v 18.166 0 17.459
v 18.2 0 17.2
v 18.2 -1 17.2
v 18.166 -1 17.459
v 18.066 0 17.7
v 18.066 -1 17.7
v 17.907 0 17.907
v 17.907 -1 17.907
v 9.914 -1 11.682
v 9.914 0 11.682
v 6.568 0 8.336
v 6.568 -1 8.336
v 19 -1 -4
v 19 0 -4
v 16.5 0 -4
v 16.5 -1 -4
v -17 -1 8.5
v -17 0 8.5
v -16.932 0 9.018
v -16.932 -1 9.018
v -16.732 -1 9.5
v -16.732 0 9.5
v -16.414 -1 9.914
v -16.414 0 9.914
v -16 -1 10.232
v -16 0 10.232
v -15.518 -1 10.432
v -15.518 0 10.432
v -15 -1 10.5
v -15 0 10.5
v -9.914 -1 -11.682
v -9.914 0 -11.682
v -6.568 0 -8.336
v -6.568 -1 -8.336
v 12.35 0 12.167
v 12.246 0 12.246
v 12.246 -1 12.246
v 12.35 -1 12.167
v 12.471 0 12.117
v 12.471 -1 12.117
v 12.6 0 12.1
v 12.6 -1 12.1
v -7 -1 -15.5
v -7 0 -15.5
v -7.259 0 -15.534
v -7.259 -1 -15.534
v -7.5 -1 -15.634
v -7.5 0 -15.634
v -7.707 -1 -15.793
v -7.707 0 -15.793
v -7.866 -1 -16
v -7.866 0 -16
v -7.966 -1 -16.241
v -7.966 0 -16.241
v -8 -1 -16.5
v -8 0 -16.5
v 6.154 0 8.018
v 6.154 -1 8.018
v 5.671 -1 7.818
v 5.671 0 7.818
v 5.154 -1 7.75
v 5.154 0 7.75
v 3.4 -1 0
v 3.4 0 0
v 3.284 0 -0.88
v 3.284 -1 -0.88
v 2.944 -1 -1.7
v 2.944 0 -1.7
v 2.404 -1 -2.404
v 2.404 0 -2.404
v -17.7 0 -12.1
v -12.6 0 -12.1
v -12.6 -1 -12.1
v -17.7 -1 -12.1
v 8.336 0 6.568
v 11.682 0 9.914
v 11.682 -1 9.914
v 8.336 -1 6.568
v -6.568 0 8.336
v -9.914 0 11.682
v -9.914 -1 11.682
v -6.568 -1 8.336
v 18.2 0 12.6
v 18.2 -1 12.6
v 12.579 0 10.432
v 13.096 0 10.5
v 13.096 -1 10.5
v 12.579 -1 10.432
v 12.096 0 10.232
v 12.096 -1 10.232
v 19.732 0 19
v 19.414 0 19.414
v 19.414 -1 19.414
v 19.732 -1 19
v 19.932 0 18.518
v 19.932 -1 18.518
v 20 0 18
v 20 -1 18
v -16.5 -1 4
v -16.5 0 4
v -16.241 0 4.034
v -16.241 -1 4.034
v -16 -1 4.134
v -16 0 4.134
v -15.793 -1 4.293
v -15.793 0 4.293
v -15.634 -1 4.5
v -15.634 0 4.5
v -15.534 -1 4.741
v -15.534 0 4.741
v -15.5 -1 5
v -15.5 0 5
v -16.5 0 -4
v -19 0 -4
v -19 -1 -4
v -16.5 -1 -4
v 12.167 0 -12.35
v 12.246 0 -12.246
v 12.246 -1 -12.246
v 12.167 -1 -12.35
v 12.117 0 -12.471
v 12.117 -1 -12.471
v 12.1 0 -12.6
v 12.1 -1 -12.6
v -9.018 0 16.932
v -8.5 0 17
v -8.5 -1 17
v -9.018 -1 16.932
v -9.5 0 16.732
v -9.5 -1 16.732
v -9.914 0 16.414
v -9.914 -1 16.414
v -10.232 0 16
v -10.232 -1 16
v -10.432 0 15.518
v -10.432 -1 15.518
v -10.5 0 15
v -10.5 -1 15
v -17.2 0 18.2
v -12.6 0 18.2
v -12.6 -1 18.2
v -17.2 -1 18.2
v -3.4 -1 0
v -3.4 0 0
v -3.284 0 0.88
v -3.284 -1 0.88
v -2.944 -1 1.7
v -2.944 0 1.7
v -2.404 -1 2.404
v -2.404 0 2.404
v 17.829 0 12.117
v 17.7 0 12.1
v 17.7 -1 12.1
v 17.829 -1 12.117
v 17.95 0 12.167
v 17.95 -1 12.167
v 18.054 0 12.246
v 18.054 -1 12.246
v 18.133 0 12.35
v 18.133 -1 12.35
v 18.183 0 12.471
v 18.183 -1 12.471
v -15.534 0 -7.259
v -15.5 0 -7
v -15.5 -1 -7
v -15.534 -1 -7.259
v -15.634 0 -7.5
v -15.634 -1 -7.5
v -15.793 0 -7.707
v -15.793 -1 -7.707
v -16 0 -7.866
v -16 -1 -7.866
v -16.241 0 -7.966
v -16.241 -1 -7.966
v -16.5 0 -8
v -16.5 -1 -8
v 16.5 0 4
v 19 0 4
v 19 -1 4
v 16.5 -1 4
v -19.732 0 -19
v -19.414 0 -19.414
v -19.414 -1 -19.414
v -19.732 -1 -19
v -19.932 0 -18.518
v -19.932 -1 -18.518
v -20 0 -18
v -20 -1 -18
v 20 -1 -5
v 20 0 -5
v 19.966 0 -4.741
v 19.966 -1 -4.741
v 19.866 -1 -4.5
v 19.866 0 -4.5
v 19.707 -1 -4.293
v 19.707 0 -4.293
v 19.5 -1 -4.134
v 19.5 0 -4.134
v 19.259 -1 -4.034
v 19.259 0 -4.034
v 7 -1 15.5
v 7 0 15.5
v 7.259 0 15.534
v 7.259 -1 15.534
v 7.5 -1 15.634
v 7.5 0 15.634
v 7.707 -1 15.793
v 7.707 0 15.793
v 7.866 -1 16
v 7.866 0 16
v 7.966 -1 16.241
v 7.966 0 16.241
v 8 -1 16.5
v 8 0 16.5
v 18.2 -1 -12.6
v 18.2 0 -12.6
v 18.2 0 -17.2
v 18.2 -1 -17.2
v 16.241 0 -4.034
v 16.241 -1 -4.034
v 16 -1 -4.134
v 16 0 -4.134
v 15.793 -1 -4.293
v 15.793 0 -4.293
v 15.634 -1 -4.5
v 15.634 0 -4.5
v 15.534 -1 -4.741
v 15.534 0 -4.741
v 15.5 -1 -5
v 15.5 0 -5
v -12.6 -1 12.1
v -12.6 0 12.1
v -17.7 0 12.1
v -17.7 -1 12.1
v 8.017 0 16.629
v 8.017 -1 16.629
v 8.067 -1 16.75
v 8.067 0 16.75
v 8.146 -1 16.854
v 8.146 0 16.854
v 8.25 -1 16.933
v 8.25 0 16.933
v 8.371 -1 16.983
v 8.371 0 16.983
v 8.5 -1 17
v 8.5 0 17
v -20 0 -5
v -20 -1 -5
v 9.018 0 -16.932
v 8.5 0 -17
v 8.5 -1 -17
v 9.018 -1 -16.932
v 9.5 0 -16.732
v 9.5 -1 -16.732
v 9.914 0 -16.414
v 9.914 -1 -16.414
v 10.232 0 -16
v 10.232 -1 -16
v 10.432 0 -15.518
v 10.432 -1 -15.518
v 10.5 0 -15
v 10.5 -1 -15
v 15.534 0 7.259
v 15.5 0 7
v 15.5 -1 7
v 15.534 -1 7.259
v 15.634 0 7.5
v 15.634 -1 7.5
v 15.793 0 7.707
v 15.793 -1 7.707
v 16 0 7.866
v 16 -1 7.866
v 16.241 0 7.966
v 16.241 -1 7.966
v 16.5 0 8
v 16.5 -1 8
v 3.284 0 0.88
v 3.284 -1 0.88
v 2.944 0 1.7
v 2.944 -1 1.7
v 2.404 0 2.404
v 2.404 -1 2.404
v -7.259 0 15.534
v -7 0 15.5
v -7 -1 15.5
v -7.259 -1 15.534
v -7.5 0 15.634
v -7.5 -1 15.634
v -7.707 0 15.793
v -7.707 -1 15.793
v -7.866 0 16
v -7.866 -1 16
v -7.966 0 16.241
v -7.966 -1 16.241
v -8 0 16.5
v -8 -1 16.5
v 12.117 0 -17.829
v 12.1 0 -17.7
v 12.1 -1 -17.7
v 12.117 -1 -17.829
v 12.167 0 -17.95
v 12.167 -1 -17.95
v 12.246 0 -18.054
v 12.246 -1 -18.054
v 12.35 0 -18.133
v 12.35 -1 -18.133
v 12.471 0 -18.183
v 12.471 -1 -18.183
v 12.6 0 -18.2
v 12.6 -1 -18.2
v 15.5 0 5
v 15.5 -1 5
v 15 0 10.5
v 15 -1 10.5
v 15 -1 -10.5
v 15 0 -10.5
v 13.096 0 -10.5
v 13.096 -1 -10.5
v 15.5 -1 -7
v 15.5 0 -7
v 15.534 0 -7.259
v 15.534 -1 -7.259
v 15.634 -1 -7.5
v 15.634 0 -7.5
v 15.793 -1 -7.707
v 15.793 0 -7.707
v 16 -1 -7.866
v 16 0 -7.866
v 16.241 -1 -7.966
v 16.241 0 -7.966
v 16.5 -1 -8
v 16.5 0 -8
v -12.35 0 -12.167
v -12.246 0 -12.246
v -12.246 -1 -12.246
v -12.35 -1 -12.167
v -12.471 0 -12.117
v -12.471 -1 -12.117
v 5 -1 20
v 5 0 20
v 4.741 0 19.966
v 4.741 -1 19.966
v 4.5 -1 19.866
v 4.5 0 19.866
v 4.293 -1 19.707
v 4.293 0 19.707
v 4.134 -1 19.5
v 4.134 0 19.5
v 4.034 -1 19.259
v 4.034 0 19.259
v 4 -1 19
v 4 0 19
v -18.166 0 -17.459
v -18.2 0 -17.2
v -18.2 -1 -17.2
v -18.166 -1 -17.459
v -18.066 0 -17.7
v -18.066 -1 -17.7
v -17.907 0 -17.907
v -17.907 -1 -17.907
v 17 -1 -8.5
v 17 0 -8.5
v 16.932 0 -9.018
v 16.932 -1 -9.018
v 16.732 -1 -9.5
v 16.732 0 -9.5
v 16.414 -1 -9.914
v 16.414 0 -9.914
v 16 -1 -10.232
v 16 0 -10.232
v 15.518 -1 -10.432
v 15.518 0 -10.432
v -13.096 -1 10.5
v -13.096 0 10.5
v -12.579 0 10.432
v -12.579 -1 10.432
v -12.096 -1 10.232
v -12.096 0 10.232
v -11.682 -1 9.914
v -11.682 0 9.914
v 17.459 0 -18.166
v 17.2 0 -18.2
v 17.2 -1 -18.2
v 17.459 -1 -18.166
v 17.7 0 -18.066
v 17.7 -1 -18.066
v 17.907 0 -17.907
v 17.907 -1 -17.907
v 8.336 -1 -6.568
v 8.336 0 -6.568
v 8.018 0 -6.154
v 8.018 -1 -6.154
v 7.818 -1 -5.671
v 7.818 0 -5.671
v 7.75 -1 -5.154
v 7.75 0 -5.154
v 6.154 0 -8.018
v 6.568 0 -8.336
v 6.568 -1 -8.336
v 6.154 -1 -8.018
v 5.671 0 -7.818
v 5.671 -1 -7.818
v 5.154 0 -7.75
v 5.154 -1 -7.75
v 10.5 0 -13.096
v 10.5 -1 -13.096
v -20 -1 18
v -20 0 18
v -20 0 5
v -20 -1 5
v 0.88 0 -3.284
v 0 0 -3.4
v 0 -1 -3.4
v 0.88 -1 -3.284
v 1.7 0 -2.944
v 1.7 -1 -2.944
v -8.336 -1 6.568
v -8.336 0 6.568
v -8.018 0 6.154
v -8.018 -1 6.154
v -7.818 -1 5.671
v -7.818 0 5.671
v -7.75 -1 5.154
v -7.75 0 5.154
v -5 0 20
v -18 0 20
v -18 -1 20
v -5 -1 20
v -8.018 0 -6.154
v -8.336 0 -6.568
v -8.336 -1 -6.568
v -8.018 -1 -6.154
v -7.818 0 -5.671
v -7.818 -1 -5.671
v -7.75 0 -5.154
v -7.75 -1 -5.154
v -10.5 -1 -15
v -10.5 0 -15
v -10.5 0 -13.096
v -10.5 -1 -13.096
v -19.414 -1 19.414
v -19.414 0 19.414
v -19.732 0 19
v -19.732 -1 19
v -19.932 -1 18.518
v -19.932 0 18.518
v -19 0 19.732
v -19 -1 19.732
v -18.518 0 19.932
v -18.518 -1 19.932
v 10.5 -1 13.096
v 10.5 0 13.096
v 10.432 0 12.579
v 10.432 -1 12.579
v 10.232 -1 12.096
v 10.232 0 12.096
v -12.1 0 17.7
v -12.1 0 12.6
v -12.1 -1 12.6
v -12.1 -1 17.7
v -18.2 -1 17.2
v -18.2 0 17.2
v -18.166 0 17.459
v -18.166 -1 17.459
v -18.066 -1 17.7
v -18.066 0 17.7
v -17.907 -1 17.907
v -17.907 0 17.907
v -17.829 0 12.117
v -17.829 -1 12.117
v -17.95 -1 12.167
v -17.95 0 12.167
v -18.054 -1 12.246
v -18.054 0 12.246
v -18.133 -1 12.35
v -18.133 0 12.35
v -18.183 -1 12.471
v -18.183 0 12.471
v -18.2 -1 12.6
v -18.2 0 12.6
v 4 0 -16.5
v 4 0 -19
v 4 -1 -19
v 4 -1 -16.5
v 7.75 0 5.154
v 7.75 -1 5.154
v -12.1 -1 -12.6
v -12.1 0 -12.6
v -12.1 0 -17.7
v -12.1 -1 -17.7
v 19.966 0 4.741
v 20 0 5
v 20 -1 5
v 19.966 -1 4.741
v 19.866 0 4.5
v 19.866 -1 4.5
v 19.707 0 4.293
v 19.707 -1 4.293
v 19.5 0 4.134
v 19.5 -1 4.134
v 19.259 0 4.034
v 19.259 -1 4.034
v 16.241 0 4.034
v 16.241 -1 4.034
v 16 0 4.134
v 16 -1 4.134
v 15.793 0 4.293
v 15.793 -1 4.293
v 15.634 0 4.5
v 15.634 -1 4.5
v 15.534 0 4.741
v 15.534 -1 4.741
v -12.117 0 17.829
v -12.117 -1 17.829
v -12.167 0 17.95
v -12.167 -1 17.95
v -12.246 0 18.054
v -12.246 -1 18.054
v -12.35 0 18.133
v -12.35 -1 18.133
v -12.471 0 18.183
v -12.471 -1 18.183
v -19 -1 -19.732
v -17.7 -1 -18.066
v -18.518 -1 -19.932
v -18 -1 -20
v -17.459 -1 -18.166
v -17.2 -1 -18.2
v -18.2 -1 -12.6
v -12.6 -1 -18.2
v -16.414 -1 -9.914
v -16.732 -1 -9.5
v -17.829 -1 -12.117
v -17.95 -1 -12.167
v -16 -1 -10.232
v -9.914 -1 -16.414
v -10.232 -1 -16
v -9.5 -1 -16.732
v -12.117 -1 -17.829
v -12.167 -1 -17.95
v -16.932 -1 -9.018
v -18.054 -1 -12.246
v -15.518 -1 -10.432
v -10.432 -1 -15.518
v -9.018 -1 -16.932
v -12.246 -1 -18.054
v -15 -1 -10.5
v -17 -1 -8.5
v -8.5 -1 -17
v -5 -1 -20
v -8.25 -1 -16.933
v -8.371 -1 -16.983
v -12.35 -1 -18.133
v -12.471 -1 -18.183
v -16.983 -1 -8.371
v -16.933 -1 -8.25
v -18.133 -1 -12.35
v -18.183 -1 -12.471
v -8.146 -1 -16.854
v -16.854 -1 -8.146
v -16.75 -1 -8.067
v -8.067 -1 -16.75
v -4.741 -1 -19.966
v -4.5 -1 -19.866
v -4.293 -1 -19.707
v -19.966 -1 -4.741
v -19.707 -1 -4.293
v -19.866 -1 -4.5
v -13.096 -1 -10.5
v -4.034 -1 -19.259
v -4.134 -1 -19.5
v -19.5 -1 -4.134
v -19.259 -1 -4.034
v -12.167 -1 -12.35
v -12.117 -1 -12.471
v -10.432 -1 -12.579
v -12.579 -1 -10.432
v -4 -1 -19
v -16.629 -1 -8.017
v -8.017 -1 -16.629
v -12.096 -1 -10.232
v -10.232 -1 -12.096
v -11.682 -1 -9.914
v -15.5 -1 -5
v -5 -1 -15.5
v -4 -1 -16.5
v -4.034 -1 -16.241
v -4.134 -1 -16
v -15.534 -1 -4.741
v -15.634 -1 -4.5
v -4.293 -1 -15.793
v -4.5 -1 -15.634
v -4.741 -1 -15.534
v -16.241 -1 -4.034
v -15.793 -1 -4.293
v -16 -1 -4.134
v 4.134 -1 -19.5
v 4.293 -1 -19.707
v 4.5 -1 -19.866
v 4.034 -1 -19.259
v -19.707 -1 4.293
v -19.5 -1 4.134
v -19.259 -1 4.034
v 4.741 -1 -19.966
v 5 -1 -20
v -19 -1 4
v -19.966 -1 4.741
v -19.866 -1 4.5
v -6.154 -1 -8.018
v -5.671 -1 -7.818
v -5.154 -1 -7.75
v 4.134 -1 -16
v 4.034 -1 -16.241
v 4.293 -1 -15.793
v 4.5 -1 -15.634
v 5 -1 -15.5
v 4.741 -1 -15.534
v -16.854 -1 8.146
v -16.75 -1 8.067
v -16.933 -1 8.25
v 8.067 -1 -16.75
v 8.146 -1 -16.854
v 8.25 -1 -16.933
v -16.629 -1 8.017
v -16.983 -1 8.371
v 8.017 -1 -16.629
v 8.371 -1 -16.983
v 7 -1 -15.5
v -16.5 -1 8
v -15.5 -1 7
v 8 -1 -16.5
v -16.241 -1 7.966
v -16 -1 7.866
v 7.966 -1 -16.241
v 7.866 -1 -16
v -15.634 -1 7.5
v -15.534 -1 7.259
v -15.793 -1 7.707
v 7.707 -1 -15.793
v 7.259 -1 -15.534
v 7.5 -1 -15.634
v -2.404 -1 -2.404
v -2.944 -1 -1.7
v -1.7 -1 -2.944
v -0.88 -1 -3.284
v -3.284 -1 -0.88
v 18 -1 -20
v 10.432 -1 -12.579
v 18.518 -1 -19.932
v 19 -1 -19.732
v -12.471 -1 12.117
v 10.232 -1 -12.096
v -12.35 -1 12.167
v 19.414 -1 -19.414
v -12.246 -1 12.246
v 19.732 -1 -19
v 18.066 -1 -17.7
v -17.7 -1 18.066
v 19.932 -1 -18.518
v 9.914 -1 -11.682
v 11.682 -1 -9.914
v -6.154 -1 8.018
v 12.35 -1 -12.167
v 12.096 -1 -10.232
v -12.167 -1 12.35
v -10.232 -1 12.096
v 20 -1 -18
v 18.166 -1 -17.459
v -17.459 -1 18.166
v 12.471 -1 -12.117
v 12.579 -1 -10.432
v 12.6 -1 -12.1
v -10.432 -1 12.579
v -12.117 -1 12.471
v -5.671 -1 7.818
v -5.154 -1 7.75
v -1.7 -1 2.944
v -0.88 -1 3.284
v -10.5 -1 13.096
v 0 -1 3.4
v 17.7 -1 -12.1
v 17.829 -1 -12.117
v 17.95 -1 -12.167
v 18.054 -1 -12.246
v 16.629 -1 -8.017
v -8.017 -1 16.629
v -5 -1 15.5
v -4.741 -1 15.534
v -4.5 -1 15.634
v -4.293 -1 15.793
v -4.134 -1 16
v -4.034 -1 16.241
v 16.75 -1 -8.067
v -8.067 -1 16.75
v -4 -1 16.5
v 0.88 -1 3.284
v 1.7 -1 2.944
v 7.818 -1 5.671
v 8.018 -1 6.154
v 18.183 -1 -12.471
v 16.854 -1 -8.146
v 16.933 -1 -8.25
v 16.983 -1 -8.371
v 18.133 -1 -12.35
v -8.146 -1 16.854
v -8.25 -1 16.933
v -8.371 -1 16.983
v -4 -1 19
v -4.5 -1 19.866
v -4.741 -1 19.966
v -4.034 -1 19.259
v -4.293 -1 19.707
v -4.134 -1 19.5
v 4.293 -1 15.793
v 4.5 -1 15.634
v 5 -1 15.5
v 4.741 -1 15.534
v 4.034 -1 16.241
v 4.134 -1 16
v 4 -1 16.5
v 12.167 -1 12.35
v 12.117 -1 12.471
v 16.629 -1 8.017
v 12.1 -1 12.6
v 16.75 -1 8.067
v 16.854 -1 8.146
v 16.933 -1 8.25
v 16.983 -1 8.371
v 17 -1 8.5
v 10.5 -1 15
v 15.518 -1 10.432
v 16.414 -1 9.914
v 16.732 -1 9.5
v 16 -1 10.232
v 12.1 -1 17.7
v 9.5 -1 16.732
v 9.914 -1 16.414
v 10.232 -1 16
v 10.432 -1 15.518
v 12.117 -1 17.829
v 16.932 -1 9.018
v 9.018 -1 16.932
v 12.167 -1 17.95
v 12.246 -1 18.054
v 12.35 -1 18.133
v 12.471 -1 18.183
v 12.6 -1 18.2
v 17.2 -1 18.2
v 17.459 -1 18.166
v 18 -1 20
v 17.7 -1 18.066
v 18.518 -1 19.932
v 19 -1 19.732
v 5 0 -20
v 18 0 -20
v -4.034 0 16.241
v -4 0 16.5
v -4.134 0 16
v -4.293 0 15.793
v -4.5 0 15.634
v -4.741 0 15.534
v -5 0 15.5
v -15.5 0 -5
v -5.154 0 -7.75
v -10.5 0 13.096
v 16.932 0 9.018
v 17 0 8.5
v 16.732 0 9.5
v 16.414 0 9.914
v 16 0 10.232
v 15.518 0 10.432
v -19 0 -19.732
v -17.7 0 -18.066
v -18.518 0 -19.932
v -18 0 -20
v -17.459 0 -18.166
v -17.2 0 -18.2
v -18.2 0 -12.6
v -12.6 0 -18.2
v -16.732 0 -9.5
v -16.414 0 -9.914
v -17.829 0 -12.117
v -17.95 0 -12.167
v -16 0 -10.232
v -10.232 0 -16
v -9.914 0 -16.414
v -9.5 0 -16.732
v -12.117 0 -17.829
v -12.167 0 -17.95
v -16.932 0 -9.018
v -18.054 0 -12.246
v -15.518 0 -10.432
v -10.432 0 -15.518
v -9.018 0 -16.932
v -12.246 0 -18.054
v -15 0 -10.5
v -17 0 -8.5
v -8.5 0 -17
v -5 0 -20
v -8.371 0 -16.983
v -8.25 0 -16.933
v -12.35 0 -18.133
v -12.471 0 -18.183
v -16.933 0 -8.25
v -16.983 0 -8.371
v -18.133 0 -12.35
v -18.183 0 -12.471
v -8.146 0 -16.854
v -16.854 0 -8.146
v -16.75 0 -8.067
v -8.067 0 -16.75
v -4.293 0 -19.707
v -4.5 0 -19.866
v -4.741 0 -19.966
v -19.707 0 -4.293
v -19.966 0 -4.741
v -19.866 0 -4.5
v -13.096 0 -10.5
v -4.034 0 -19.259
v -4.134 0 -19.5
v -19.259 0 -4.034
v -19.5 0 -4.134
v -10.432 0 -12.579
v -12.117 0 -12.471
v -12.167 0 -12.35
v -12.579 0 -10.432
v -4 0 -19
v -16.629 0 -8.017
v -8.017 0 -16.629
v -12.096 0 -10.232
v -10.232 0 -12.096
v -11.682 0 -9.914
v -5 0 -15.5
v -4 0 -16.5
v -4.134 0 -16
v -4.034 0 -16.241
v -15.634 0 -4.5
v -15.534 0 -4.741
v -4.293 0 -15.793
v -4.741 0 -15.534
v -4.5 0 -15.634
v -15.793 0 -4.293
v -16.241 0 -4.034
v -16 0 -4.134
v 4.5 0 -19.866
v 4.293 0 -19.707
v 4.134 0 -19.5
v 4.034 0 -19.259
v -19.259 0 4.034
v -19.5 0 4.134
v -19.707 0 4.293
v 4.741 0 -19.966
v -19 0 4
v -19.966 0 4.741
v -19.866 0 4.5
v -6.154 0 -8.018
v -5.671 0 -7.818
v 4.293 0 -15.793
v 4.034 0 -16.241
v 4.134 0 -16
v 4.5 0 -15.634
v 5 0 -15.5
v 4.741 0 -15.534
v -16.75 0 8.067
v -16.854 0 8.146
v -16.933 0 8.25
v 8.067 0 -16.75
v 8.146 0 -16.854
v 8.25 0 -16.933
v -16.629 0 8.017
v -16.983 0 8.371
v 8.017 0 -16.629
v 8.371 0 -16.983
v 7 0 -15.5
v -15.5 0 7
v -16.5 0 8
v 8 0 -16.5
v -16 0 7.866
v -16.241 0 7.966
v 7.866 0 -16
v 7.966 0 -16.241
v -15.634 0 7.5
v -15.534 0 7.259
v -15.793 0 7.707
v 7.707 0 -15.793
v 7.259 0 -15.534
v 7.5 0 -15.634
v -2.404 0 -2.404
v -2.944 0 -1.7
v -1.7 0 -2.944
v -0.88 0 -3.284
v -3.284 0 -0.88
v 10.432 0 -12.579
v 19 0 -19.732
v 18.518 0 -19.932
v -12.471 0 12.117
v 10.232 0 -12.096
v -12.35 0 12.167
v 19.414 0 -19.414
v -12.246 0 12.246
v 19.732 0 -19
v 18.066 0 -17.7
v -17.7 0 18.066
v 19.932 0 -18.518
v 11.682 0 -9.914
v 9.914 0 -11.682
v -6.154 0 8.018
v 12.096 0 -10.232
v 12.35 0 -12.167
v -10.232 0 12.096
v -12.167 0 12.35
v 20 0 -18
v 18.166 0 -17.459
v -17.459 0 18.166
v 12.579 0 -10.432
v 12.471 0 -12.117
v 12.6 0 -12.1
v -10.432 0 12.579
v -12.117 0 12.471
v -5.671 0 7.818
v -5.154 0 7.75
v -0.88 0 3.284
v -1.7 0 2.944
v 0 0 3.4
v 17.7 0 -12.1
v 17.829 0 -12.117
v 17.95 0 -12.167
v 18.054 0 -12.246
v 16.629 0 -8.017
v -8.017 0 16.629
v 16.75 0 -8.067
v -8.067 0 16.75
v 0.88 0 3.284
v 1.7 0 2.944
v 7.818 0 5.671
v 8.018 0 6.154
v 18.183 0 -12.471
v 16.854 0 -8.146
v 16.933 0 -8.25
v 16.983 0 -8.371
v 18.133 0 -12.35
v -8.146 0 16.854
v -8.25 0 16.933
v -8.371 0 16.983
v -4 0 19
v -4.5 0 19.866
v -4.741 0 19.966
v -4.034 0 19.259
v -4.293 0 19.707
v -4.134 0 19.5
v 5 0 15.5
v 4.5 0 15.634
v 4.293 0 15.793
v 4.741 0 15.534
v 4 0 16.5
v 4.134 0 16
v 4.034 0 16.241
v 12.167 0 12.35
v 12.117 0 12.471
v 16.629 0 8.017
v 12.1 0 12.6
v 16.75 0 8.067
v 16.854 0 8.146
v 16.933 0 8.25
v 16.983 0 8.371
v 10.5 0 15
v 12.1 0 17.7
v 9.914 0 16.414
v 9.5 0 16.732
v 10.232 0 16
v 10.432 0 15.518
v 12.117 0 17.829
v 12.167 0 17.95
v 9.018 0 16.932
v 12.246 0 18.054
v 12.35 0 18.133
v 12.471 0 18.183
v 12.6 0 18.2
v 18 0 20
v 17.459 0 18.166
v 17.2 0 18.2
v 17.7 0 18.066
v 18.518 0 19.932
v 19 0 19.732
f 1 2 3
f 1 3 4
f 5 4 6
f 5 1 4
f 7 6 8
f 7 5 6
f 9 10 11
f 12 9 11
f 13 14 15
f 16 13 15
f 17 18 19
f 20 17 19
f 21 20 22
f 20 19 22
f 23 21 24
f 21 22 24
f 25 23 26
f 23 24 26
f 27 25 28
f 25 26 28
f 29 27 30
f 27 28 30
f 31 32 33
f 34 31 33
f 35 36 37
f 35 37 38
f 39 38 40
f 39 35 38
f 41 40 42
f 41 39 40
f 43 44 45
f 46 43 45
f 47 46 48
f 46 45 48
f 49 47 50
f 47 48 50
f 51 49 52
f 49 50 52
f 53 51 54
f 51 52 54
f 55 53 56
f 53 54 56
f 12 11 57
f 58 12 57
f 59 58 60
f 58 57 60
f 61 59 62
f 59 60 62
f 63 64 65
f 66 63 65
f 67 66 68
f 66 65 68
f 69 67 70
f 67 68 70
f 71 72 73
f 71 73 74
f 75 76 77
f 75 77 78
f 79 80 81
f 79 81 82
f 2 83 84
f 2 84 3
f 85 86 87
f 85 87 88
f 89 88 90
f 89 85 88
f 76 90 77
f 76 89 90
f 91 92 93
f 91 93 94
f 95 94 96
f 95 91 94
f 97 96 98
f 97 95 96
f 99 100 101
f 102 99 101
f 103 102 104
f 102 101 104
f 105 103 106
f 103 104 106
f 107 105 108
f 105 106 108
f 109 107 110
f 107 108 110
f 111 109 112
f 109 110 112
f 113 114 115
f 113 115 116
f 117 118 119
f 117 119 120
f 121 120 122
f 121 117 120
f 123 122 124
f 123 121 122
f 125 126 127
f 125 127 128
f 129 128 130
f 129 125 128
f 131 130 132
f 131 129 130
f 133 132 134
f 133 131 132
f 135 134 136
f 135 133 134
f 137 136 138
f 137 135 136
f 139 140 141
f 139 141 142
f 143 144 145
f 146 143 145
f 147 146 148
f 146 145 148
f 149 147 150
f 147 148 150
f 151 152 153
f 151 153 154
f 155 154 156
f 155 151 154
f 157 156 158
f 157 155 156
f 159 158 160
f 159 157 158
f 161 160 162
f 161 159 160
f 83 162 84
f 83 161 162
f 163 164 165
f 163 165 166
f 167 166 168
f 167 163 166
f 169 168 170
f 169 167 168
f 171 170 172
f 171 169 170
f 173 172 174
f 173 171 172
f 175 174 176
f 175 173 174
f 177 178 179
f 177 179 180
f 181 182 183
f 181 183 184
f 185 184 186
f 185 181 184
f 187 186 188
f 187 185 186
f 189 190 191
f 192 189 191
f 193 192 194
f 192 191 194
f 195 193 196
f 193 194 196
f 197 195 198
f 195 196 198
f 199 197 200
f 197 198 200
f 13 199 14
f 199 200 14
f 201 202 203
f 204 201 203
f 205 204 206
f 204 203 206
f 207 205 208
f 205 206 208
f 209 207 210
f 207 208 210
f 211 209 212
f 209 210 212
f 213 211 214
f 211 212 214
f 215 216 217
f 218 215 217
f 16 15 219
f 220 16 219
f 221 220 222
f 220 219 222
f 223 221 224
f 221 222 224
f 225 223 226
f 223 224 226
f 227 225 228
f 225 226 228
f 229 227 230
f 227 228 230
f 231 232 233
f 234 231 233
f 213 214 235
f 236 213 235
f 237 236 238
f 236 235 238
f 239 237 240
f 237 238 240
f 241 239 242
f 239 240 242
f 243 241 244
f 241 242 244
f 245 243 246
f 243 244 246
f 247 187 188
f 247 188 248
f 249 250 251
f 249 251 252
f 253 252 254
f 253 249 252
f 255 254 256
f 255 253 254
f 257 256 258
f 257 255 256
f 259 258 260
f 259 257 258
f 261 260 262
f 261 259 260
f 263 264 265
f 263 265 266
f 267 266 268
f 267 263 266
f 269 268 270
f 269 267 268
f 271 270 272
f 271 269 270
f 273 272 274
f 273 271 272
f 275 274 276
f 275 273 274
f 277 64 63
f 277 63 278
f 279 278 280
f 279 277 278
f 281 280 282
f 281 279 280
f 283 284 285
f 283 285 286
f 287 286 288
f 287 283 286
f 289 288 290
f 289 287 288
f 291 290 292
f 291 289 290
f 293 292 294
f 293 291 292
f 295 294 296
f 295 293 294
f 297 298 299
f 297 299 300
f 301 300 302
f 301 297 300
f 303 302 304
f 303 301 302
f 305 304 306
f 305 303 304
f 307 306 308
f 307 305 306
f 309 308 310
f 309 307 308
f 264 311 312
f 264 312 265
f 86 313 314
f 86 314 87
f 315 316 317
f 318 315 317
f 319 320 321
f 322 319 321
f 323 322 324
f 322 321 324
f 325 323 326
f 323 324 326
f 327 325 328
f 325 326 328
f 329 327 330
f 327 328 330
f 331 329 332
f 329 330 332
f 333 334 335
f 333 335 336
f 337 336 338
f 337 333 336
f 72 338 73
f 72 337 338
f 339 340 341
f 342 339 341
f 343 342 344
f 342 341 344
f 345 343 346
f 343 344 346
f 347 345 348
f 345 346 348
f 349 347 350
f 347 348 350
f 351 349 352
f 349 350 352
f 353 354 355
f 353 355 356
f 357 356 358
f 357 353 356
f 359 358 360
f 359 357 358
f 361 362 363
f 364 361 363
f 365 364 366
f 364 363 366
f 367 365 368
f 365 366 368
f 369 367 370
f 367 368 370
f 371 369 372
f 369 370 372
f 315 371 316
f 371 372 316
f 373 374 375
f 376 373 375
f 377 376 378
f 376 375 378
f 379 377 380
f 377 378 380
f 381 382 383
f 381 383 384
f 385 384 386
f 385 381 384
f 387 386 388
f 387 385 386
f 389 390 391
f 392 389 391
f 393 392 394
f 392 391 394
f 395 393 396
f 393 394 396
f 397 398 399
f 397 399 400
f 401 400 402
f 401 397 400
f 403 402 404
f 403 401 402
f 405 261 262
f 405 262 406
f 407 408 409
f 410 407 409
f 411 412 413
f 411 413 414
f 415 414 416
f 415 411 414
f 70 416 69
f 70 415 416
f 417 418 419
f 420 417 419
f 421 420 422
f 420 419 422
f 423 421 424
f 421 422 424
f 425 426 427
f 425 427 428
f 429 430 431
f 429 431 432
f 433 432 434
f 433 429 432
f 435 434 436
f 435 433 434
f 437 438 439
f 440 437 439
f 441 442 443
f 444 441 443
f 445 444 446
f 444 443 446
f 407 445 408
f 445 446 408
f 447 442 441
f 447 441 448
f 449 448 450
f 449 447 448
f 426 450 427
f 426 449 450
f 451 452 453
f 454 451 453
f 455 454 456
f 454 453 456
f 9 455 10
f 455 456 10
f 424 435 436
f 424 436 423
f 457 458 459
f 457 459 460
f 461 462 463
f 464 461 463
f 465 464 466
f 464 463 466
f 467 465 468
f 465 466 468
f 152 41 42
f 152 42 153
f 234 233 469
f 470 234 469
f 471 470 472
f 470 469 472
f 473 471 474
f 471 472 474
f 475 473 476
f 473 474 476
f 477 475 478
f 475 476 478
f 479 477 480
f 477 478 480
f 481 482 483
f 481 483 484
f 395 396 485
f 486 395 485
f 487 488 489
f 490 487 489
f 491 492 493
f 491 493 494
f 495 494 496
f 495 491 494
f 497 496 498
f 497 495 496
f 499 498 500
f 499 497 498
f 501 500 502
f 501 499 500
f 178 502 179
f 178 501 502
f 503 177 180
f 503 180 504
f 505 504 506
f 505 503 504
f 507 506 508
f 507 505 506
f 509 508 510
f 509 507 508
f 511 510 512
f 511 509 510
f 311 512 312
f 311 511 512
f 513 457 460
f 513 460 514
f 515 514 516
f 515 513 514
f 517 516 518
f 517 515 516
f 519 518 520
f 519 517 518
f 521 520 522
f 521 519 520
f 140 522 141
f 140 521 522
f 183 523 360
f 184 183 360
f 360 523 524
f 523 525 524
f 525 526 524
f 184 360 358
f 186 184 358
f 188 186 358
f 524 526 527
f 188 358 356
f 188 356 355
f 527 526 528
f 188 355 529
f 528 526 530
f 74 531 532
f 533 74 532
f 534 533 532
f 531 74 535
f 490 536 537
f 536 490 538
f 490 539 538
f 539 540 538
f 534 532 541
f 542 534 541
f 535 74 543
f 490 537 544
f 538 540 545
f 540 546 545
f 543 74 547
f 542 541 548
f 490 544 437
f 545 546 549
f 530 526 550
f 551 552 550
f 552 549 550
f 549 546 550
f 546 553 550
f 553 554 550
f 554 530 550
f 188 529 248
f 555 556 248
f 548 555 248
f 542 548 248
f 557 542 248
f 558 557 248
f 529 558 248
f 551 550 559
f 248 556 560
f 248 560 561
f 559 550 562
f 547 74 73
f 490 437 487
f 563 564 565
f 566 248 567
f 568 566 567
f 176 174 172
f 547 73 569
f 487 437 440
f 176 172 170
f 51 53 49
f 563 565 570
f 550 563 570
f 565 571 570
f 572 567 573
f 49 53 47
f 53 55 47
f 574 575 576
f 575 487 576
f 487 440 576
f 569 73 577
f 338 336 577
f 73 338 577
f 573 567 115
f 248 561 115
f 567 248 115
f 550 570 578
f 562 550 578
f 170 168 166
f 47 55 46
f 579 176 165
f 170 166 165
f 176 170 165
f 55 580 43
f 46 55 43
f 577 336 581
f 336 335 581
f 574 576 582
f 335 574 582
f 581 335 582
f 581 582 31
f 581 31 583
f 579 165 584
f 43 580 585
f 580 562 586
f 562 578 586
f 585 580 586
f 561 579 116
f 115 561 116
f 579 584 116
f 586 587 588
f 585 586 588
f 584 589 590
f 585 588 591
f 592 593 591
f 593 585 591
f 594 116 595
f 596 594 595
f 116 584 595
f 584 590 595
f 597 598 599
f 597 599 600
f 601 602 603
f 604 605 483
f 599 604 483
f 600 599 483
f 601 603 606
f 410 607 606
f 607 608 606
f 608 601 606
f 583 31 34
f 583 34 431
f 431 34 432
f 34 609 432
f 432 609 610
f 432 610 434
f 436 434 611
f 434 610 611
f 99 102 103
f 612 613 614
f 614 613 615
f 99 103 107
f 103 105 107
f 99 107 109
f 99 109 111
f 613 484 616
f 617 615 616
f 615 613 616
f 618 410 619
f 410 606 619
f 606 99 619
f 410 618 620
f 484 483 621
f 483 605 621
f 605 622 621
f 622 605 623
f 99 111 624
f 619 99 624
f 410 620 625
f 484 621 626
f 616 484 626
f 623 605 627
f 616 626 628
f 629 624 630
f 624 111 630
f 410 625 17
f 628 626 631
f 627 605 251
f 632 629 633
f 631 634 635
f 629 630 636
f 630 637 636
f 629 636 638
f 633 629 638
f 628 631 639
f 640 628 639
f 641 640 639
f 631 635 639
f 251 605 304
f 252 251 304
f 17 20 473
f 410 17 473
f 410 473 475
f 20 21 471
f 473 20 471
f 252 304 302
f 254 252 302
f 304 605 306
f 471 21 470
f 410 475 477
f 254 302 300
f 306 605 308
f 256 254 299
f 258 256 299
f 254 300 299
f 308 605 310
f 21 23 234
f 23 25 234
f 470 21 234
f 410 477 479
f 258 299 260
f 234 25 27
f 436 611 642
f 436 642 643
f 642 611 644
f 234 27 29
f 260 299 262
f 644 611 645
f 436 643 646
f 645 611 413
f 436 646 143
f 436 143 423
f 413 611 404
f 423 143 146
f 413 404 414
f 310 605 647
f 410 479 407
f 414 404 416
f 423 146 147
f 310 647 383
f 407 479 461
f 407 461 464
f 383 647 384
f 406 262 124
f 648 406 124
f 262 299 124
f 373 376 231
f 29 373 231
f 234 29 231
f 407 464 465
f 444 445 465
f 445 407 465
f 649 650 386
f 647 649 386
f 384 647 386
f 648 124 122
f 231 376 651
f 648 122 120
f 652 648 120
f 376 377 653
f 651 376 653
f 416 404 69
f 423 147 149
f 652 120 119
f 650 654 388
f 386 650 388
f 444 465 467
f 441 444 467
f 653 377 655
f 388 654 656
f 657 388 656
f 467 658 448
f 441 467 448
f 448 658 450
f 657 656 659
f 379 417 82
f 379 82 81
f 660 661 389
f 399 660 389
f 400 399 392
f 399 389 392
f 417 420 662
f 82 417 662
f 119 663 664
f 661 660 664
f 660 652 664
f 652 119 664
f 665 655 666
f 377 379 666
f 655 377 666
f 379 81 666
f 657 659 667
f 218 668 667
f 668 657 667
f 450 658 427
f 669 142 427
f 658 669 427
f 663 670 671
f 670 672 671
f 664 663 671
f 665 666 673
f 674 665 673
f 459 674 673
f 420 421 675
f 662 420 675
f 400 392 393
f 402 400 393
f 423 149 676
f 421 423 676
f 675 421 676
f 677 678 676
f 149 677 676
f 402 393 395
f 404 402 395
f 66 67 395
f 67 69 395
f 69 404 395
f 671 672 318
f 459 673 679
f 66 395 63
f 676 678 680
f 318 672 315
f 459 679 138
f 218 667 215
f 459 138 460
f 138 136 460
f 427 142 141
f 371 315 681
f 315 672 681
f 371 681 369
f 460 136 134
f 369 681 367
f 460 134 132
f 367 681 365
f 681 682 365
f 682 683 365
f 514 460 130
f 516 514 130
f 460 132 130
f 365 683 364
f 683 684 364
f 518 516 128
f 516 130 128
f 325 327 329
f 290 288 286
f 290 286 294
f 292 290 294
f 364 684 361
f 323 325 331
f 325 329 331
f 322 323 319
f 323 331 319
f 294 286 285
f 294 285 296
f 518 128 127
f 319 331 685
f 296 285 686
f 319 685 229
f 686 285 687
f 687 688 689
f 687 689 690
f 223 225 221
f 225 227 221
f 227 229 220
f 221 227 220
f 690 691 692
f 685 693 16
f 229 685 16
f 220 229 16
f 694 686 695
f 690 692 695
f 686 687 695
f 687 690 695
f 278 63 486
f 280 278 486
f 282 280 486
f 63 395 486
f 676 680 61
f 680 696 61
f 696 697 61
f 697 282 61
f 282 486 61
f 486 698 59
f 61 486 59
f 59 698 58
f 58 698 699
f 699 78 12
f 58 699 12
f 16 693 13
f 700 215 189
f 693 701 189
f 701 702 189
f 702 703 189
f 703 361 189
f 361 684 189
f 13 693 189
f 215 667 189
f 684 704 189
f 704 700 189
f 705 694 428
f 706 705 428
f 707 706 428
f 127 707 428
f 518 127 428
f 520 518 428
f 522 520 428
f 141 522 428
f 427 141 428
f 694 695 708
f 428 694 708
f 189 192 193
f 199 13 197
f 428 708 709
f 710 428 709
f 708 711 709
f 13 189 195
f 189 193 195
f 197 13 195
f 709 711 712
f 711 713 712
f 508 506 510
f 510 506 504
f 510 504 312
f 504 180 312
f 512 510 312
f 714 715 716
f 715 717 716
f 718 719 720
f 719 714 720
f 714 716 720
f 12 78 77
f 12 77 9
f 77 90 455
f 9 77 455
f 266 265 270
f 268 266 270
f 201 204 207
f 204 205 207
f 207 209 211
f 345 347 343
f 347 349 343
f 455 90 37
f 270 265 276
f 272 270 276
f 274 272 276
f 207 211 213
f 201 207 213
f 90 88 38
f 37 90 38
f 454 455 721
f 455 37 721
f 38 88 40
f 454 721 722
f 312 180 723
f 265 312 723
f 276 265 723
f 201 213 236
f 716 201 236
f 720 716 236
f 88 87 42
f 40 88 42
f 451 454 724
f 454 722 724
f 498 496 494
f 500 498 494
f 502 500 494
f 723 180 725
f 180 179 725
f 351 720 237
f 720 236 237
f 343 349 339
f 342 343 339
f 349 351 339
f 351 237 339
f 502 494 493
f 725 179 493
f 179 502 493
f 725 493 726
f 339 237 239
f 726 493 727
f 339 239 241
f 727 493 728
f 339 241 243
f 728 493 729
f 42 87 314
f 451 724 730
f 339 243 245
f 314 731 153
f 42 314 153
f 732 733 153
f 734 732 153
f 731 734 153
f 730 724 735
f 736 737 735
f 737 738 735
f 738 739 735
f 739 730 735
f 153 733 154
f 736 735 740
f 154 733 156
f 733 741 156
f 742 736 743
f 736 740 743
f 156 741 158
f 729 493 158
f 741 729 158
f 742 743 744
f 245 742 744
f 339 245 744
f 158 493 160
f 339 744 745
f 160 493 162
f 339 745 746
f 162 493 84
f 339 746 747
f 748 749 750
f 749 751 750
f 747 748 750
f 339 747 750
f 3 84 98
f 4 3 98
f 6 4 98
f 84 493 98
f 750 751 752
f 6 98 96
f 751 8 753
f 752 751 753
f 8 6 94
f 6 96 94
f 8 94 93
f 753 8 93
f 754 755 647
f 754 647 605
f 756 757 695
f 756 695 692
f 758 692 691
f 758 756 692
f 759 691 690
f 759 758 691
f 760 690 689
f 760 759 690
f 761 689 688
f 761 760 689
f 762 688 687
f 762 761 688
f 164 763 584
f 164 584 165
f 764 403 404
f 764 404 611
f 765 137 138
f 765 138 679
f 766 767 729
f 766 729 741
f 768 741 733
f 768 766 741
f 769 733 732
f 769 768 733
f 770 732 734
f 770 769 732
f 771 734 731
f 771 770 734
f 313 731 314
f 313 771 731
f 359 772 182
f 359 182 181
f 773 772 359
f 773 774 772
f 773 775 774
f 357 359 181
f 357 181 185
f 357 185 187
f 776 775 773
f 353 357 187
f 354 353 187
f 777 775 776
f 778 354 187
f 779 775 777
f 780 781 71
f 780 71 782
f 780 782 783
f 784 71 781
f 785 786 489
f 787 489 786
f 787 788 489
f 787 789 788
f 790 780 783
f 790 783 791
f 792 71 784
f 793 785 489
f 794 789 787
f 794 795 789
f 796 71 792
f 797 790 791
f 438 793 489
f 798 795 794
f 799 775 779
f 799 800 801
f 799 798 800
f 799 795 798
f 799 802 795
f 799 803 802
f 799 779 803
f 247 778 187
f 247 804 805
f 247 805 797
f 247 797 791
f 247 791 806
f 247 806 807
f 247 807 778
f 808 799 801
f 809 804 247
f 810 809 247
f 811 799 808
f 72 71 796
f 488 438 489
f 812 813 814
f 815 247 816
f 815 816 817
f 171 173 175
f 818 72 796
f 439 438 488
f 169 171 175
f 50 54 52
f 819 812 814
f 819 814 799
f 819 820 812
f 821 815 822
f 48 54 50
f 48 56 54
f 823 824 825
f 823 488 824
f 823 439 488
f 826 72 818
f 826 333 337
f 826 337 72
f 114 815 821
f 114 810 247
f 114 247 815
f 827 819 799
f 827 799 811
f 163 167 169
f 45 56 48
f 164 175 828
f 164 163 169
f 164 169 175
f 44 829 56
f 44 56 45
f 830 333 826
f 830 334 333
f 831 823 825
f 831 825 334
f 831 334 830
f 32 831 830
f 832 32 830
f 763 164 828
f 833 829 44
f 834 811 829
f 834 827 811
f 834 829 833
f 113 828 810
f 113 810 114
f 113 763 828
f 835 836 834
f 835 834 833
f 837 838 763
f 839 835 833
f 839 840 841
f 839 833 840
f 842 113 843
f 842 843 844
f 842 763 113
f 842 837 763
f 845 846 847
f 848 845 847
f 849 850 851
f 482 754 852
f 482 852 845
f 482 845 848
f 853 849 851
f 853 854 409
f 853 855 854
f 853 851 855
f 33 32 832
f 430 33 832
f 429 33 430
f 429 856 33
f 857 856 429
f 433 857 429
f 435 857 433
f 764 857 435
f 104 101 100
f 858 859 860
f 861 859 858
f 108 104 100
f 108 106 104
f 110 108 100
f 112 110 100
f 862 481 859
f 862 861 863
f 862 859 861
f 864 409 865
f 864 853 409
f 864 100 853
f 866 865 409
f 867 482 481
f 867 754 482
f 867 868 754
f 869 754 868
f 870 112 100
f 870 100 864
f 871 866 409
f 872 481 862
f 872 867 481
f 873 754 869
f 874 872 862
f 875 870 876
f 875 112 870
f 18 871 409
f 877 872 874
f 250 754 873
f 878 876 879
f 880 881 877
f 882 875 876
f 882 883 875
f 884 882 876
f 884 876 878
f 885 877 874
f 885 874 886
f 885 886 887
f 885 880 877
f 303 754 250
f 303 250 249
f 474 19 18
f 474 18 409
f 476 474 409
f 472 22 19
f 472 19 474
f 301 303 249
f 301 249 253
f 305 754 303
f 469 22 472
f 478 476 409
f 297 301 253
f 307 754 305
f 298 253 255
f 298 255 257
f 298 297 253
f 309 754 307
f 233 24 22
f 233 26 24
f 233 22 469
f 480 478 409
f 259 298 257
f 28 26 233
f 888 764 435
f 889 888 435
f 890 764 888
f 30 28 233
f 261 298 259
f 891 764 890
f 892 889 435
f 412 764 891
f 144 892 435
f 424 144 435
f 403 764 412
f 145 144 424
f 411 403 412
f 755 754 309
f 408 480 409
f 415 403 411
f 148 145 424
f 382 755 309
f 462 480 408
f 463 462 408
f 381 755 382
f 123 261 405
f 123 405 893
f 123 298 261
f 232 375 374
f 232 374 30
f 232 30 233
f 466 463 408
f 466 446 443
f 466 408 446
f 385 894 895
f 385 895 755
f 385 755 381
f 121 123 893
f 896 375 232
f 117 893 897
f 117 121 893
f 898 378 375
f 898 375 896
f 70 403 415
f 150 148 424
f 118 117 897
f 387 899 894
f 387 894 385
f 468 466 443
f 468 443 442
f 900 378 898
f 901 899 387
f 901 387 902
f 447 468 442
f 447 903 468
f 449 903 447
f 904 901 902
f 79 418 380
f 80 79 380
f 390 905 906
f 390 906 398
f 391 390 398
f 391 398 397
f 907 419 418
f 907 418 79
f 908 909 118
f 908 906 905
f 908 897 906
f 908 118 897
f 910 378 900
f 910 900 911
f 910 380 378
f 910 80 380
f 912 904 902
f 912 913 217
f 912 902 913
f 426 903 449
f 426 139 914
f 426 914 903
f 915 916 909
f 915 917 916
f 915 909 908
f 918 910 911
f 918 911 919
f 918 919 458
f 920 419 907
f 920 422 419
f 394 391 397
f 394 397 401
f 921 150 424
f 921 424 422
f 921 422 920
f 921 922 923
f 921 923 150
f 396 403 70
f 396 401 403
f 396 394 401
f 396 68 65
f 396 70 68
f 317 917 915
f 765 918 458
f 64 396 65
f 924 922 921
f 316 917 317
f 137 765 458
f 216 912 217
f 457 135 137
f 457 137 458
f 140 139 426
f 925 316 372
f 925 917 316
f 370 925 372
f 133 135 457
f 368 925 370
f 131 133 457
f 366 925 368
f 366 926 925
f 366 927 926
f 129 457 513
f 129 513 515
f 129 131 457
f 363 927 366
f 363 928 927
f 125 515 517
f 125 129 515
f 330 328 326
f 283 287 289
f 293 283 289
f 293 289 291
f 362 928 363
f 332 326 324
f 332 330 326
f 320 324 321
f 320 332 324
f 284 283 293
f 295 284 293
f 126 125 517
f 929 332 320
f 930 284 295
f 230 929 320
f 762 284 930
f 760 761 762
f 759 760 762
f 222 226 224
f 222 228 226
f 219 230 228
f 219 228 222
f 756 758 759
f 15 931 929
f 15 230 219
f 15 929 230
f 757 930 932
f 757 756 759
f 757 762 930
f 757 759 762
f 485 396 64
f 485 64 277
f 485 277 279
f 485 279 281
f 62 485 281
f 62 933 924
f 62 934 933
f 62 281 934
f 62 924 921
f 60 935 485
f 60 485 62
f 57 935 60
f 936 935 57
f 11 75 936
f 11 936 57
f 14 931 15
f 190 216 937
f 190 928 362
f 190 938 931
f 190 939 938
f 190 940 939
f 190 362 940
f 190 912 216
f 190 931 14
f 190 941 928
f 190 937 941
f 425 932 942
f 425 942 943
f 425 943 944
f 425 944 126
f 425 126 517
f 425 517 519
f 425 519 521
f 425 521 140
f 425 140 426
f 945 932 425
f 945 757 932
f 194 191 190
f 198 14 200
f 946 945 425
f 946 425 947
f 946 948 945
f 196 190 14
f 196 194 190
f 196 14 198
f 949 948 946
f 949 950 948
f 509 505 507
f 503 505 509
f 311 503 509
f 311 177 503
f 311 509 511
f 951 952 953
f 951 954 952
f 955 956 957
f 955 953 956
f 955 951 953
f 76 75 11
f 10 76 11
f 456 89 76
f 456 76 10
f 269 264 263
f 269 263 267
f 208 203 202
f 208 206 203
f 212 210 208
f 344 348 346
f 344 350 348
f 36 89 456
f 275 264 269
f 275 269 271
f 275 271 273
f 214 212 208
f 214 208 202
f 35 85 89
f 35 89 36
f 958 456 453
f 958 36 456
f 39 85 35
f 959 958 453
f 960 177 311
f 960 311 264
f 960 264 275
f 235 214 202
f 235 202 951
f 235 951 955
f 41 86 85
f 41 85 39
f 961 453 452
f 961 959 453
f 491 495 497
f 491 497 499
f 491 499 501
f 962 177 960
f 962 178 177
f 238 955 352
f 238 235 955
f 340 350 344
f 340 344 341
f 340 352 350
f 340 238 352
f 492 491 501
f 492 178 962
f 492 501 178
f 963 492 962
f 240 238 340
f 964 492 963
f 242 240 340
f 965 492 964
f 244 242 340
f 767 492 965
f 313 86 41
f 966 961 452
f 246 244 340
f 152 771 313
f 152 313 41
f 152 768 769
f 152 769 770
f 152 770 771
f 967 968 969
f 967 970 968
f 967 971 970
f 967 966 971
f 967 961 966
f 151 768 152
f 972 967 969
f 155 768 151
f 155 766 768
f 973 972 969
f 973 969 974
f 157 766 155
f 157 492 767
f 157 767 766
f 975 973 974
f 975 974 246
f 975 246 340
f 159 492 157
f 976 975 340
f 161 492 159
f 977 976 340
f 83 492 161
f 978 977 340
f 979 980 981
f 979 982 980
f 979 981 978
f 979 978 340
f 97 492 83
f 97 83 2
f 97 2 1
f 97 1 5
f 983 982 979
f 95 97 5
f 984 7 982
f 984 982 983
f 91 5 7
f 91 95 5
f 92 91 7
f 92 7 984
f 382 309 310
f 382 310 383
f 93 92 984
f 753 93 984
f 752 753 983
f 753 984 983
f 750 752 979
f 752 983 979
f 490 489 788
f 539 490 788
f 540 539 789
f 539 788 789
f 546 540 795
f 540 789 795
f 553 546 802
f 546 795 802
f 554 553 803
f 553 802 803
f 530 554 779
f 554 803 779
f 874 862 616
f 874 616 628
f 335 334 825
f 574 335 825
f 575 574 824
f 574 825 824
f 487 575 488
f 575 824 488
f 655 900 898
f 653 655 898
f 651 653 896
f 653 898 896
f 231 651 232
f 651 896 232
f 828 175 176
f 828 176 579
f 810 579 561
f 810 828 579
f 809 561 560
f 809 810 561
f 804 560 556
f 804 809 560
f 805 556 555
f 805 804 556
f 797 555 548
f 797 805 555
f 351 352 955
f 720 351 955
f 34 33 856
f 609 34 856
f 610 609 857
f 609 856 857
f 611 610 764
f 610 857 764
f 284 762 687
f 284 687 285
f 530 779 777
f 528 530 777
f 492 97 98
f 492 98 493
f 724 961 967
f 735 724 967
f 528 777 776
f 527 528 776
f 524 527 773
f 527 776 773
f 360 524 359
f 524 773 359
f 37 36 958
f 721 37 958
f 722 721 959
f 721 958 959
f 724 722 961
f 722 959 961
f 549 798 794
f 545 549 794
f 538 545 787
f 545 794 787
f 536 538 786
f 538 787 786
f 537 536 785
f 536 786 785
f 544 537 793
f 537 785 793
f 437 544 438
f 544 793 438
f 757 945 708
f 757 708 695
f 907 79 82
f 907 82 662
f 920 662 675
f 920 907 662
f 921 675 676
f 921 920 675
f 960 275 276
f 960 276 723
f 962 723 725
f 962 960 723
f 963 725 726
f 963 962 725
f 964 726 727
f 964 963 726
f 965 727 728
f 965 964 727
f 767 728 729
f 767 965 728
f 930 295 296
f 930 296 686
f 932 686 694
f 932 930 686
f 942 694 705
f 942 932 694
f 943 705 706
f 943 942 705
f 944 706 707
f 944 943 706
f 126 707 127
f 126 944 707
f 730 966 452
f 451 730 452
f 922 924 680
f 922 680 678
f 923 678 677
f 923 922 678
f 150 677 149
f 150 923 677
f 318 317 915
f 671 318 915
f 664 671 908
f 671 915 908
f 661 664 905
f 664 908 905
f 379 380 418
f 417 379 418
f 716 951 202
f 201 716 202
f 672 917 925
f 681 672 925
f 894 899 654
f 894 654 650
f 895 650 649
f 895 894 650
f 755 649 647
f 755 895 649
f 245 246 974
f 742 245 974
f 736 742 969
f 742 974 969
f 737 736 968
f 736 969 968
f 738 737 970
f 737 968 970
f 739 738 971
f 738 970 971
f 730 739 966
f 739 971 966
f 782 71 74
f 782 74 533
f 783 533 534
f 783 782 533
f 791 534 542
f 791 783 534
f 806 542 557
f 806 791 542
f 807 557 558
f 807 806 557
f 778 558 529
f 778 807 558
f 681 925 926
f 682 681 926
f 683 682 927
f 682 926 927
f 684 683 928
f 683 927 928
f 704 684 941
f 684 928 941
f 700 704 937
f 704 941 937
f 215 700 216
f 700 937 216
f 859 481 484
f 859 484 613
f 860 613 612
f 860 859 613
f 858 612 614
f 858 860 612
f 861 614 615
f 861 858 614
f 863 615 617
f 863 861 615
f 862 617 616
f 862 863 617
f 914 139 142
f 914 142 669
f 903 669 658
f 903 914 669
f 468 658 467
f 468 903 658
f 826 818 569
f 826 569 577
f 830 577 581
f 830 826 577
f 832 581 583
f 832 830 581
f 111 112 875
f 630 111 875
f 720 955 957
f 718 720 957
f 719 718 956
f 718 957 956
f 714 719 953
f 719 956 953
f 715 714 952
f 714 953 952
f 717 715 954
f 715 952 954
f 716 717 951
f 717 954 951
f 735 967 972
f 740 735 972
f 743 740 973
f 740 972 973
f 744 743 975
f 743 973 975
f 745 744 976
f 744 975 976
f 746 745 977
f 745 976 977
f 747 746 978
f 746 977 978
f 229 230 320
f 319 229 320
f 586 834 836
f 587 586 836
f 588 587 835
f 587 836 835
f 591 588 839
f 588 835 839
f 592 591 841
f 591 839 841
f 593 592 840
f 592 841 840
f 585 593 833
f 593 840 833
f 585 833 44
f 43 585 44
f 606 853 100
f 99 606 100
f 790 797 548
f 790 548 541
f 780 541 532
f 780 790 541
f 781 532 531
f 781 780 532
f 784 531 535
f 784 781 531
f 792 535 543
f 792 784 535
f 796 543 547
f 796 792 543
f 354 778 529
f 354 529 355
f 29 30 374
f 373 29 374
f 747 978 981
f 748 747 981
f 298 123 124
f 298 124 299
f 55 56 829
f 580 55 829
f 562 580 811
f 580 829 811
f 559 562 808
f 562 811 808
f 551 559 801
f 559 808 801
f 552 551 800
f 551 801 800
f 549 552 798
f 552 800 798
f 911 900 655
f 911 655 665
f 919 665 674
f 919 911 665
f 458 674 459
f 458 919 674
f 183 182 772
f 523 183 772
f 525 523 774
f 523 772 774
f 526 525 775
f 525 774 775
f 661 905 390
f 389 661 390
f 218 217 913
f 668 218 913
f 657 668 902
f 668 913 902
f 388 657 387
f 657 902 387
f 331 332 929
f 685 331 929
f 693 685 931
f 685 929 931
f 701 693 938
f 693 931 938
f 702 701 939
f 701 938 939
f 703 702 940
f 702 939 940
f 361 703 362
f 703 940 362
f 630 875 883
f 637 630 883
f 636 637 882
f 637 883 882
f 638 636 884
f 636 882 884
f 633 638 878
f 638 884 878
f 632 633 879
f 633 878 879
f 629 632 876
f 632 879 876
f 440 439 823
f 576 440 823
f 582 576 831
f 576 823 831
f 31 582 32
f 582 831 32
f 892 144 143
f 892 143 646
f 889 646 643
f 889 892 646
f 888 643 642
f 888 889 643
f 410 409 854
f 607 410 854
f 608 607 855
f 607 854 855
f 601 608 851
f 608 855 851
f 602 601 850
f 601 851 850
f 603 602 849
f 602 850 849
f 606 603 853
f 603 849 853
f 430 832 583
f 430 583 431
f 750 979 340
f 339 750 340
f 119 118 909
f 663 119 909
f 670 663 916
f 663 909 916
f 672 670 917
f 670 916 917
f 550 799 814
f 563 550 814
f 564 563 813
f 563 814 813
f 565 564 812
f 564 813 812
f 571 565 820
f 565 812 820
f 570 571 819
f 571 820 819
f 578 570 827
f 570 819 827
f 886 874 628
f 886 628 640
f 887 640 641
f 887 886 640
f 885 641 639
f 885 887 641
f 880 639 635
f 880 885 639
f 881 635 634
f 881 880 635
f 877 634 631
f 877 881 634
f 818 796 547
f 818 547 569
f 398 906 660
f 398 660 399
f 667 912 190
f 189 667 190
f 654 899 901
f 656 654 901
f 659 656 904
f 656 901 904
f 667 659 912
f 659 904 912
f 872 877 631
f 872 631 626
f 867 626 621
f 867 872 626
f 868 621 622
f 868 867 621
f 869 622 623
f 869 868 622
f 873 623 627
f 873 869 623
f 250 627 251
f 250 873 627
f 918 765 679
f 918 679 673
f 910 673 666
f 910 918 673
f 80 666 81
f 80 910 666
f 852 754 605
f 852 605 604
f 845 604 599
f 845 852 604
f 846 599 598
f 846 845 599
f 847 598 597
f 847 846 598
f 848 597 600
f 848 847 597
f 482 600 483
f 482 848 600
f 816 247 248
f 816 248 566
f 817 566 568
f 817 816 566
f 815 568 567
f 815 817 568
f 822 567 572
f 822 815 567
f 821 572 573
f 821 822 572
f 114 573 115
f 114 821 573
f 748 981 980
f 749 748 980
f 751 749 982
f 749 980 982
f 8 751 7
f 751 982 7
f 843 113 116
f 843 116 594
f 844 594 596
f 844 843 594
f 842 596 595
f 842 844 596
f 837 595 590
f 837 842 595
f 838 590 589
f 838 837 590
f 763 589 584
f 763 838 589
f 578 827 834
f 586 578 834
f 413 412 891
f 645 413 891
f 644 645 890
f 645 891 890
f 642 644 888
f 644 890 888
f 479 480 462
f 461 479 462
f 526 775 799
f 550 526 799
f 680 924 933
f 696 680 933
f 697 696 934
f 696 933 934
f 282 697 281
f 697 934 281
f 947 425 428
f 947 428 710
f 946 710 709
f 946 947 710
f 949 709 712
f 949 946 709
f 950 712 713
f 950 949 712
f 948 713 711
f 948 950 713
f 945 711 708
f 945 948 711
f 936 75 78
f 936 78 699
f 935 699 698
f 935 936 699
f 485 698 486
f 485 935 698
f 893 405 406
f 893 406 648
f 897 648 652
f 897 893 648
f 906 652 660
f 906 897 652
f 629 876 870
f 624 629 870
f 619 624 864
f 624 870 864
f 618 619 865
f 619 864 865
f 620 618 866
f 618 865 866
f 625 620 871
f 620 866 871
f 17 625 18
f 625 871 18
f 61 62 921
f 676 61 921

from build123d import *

# Parameters (mm, degrees)
F1_DEPTH = 1


with BuildPart() as f1:
    # F0 (on Front) → F1 (new body)
    with BuildSketch(Plane.XZ):
        with BuildLine():
            ThreePointArc((-19.4142135624, 19.4142135624), (-19.847759065, 18.7653668647), (-20, 18))
            Line((-20, 18), (-20, 5))
            ThreePointArc((-20, 5), (-19.7071067812, 4.2928932188), (-19, 4))
            Line((-19, 4), (-16.5, 4))
            ThreePointArc((-16.5, 4), (-15.7928932188, 4.2928932188), (-15.5, 5))
            Line((-15.5, 5), (-15.5, 7))
            ThreePointArc((-15.5, 7), (-15.7928932188, 7.7071067812), (-16.5, 8))
            ThreePointArc((-16.5, 8), (-16.8535533906, 8.1464466094), (-17, 8.5))
            ThreePointArc((-17, 8.5), (-16.4142135624, 9.9142135624), (-15, 10.5))
            Line((-15, 10.5), (-13.0961940777, 10.5))
            ThreePointArc((-13.0961940777, 10.5), (-12.330827213, 10.347759065), (-11.6819805153, 9.9142135624))
            Line((-11.6819805153, 9.9142135624), (-8.3357864376, 6.5680194847))
            ThreePointArc((-8.3357864376, 6.5680194847), (-7.902240935, 5.919172787), (-7.75, 5.1538059223))
            Line((-7.75, 5.1538059223), (-7.75, 0))
            Line((-7.75, 0), (-3.4, 0))
            ThreePointArc((-3.4, 0), (-3.1411904105, 1.30112367), (-2.404163056, 2.404163056))
            Line((-2.404163056, 2.404163056), (-12.2464466094, 12.2464466094))
            ThreePointArc((-12.2464466094, 12.2464466094), (-12.4086582838, 12.1380602337), (-12.6, 12.1))
            Line((-12.6, 12.1), (-17.7, 12.1))
            ThreePointArc((-17.7, 12.1), (-18.0535533906, 12.2464466094), (-18.2, 12.6))
            Line((-18.2, 12.6), (-18.2, 17.2))
            ThreePointArc((-18.2, 17.2), (-18.1238795325, 17.5826834324), (-17.9071067812, 17.9071067812))
            Line((-17.9071067812, 17.9071067812), (-19.4142135624, 19.4142135624))
        make_face()
    extrude(amount=F1_DEPTH)

    # F2: F1 across face


with BuildPart() as f1_1:
    add(f1.part)
    add(f1.part.mirror(Plane(origin=(-7.3253048327, -0.5, 7.3253048327), x_dir=(0, 1, 0), z_dir=(0.7071067812, 0, 0.7071067812))))

    # F3: F1 across face


with BuildPart() as f1_2:
    add(f1_1.part)
    add(f1_1.part.mirror(Plane(origin=(-5.575, -0.5, 0), x_dir=(1, 0, 0), z_dir=(0, 0, -1))))

    # F4: F1 across face


with BuildPart() as f1_3:
    add(f1_2.part)
    add(f1_2.part.mirror(Plane(origin=(0, -0.5, 5.575), x_dir=(0, 1, 0), z_dir=(1, 0, 0))))


solid = f1_3.part
